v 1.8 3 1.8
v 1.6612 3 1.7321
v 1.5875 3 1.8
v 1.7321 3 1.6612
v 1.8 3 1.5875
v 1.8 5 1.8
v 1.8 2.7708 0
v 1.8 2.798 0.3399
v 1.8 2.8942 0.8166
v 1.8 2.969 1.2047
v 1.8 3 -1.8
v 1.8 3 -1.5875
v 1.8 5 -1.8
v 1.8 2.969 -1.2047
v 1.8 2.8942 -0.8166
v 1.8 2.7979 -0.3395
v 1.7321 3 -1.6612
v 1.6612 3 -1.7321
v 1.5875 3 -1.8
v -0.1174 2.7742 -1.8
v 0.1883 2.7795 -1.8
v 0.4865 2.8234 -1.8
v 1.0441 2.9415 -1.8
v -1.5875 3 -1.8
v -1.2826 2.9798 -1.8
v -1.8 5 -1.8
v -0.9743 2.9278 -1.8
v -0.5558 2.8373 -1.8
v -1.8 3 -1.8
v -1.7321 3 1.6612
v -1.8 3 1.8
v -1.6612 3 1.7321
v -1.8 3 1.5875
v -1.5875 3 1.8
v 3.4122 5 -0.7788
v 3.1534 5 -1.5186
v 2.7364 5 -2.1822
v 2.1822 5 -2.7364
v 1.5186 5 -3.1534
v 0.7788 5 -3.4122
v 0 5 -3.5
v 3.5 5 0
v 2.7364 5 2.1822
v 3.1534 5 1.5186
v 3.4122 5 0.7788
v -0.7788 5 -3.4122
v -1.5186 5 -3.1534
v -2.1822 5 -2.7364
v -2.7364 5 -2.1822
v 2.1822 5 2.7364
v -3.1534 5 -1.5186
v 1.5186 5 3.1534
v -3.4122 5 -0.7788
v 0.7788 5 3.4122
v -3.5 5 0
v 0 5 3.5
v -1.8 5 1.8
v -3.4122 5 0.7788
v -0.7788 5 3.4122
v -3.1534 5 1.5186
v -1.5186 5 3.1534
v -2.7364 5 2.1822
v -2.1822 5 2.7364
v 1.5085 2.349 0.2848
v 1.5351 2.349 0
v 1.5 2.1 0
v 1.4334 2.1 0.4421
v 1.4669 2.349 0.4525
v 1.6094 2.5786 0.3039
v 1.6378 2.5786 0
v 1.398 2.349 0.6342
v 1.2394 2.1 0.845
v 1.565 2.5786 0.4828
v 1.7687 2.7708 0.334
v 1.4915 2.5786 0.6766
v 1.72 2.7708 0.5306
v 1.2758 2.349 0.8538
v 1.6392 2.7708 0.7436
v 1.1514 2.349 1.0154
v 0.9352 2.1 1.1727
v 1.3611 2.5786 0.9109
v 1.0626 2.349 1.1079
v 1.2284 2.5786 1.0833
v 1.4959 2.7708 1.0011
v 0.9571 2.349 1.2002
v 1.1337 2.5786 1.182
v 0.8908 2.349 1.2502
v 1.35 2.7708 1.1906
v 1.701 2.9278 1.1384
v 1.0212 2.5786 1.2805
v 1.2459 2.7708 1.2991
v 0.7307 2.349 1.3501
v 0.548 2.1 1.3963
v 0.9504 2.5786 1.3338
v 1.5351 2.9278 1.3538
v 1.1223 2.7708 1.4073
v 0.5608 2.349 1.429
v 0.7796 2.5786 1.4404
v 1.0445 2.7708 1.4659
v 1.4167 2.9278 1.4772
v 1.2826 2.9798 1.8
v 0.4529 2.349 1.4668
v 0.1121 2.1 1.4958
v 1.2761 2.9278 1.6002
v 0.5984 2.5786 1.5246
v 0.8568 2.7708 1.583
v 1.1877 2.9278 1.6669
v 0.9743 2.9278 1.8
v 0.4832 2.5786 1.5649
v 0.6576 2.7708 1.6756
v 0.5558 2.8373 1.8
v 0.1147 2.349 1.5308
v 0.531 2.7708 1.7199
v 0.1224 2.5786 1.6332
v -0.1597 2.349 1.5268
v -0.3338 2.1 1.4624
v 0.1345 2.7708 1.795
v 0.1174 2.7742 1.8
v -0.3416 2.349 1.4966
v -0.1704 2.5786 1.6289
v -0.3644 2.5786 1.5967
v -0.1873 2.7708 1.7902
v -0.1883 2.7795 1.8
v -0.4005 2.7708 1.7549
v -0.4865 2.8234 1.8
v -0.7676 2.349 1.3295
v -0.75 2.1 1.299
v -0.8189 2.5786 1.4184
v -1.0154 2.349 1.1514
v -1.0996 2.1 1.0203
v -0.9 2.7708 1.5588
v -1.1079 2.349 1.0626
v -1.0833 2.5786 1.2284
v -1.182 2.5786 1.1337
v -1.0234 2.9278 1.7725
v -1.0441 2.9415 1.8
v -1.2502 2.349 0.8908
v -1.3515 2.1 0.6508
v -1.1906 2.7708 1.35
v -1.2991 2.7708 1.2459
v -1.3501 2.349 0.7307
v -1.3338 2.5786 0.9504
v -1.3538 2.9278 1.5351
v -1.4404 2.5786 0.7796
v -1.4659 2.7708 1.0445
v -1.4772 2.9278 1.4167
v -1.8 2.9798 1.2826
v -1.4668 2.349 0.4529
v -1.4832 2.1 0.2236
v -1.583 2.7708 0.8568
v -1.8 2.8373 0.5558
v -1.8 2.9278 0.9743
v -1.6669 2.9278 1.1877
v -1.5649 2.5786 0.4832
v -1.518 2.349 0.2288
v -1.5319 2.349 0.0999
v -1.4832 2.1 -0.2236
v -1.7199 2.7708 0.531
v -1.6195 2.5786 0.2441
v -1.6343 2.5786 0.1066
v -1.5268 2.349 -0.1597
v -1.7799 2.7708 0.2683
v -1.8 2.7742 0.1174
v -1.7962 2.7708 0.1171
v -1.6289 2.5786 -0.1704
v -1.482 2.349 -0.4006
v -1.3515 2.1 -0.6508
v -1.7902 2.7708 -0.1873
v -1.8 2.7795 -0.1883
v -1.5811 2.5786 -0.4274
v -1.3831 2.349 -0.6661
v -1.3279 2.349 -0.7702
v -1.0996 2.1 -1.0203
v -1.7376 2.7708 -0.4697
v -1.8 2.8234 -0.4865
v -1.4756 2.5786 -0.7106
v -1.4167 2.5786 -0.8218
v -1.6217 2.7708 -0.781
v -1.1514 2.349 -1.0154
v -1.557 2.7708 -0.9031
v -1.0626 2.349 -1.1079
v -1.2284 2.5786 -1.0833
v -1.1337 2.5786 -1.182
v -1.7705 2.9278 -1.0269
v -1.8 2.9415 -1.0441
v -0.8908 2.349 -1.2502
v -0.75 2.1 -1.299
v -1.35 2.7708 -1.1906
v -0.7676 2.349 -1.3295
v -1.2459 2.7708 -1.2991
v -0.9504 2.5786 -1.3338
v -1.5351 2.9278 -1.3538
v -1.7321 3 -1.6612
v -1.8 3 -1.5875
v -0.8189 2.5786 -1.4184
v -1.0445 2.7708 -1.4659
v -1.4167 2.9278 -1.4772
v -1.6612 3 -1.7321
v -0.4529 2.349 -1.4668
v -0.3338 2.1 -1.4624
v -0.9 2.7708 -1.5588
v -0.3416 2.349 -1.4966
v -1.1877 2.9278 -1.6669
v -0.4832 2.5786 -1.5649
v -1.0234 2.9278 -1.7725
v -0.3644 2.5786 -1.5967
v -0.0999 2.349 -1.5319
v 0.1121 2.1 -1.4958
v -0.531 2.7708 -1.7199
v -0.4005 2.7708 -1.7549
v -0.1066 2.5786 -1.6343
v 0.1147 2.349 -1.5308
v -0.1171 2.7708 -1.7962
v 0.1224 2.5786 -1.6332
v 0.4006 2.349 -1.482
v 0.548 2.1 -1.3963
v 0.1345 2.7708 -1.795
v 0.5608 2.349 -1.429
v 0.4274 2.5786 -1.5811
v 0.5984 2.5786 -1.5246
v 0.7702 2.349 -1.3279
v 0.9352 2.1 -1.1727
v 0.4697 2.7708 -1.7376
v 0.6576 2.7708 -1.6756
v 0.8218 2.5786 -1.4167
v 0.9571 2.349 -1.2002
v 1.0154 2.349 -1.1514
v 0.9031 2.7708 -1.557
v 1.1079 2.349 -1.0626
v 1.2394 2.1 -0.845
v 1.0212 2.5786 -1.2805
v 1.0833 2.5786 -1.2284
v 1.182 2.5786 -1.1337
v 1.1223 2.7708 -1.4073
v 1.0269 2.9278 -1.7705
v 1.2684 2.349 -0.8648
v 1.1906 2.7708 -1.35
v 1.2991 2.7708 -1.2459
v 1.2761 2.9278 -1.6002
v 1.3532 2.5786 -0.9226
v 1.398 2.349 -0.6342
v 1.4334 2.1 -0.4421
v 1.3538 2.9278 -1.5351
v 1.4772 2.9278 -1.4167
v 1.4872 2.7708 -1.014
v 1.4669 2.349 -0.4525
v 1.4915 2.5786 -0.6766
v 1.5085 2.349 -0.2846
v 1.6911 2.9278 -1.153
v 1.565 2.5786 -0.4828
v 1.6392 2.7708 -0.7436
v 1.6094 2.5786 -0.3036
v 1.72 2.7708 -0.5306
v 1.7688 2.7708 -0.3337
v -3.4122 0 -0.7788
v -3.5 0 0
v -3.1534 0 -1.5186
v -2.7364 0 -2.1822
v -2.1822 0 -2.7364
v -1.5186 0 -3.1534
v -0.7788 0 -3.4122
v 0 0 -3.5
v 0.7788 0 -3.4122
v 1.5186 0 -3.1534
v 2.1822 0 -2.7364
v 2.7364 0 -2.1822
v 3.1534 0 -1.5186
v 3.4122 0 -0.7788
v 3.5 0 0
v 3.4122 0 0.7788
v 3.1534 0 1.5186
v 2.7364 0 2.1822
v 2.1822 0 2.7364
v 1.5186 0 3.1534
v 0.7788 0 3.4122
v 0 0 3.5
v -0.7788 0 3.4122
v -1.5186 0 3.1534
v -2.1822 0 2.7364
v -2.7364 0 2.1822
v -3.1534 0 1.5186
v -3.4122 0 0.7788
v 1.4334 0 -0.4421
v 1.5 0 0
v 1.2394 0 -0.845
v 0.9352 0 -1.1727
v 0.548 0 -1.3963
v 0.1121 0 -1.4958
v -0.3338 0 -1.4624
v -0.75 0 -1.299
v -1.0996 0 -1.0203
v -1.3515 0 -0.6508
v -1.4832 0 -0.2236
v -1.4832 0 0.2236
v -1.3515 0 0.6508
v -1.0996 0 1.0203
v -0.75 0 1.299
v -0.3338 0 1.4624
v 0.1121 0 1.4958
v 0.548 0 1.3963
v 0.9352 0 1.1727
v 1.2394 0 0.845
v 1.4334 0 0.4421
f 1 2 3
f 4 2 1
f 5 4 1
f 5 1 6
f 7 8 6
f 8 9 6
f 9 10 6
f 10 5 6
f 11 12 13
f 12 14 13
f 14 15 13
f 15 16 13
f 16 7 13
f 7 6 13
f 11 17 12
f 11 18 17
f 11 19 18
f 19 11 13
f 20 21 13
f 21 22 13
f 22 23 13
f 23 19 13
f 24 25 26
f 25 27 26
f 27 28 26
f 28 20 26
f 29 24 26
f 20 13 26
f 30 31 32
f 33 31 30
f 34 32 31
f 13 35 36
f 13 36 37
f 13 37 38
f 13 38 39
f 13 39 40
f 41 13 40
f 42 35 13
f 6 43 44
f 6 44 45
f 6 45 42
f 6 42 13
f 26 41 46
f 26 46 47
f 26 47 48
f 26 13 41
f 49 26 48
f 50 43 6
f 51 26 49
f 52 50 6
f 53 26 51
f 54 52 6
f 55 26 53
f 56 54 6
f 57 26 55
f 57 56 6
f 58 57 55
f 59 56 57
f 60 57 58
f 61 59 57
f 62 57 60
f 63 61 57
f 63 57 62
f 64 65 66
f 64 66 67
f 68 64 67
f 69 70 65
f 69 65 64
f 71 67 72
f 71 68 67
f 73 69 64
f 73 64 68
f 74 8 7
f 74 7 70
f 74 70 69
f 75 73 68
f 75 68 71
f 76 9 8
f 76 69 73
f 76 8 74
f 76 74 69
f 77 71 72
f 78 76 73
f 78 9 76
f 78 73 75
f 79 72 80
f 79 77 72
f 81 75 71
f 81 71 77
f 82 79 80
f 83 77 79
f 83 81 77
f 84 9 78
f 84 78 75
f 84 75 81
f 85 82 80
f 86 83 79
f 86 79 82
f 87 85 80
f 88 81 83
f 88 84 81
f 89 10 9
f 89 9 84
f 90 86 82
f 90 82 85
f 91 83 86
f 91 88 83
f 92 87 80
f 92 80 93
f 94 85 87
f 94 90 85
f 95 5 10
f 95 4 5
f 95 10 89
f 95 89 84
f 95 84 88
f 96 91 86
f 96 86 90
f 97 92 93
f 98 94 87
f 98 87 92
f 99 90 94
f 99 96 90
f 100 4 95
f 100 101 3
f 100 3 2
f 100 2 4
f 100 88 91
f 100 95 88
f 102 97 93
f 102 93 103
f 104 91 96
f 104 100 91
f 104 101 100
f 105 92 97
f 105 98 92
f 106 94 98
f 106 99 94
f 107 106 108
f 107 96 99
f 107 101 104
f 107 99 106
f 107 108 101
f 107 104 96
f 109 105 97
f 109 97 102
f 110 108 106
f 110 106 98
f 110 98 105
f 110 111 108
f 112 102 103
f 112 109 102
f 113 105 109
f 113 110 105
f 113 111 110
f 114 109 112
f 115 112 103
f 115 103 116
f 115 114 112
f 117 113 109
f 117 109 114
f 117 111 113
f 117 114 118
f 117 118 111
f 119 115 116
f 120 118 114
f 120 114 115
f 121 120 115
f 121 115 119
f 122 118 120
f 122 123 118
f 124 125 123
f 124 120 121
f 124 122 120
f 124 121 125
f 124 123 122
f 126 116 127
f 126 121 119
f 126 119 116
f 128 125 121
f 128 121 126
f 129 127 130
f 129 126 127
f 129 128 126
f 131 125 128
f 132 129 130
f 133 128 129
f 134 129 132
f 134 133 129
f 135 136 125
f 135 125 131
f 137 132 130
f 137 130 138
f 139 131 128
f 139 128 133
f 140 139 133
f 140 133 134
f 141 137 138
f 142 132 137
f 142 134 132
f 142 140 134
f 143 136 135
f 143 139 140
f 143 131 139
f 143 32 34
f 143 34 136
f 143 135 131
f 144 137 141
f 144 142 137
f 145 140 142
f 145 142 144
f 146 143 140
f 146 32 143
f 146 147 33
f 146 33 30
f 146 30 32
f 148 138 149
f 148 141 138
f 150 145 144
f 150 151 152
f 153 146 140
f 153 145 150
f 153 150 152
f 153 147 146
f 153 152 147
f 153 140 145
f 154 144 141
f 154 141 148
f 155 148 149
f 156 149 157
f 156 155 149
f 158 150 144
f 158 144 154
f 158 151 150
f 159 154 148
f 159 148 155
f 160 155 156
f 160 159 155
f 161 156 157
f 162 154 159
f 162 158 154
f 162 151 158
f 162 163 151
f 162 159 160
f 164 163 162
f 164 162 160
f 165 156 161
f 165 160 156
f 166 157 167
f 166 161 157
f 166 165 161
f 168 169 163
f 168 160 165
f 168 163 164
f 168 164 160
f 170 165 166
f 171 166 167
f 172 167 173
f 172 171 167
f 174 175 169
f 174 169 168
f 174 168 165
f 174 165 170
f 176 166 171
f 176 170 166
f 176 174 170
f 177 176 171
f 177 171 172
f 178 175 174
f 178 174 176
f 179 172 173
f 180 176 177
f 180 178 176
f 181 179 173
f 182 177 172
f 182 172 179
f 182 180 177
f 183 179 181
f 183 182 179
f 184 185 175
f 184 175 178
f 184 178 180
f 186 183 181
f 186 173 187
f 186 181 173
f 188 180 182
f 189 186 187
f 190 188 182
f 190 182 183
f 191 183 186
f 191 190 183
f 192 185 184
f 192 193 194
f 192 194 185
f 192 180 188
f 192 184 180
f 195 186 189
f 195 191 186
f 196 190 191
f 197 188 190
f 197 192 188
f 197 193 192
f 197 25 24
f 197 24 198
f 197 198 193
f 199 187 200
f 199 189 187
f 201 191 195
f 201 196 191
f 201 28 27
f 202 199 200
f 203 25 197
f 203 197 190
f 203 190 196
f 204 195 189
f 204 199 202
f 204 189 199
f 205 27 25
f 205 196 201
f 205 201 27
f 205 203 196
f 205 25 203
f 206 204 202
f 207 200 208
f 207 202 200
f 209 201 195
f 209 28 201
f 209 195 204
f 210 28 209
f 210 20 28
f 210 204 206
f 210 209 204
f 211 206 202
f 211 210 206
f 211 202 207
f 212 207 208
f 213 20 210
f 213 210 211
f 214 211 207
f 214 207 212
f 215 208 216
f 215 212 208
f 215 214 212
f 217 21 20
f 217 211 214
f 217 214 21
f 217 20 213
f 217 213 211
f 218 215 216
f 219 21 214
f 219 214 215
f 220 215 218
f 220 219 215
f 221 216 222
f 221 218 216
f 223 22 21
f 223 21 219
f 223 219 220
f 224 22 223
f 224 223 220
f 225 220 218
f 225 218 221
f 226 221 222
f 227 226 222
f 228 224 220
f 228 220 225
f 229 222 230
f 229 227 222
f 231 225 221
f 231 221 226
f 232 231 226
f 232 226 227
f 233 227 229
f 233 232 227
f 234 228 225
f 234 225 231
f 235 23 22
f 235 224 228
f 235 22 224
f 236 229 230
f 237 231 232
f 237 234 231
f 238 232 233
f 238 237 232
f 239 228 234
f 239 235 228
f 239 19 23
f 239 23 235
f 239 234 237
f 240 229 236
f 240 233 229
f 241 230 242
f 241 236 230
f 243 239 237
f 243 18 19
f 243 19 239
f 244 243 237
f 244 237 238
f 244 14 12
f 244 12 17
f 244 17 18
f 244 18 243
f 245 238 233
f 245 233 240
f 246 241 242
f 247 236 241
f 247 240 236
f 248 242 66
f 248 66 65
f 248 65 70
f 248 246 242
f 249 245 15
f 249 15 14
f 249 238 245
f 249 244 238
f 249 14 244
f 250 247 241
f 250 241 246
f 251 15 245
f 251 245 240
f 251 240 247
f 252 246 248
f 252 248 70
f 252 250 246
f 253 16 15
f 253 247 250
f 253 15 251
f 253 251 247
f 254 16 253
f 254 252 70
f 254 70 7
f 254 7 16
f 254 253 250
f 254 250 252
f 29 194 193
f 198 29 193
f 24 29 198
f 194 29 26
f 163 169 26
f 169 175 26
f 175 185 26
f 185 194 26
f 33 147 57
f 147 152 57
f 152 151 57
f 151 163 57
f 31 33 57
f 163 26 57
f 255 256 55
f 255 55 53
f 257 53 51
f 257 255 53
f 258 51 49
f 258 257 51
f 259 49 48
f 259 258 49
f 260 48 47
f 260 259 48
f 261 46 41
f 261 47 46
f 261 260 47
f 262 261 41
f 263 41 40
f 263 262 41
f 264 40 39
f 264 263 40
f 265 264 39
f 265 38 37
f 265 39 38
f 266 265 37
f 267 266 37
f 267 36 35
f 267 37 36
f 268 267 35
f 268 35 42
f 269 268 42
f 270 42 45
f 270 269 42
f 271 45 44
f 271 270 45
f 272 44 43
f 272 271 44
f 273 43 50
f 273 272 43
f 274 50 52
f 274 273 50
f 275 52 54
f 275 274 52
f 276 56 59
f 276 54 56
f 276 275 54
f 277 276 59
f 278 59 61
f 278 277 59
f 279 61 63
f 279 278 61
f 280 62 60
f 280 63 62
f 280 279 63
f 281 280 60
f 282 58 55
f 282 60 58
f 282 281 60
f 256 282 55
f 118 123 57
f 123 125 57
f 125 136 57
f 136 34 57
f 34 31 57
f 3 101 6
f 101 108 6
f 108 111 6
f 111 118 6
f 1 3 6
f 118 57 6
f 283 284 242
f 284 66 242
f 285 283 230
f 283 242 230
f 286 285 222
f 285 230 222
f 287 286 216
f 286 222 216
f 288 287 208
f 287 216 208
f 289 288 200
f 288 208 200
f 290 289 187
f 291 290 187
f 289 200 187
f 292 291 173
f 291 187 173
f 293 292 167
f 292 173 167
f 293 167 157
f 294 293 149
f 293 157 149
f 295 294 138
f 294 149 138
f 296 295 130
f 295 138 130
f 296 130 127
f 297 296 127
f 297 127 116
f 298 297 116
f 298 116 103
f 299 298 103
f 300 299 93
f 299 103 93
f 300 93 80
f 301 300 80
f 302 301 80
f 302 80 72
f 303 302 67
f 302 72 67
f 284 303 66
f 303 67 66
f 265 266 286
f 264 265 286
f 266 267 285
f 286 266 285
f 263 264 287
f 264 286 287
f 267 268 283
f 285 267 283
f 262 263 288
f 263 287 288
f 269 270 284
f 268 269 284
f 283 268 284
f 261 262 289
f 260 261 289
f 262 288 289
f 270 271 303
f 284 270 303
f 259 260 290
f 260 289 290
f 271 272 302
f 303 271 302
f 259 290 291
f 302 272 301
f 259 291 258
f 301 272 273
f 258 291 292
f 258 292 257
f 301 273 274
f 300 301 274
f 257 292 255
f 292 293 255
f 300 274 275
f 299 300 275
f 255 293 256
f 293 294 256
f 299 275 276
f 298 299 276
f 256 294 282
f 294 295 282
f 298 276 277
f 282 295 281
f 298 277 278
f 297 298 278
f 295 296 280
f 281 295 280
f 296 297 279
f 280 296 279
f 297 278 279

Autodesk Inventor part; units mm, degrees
ref_plane "YZ Plane" through (0, 0, 0) normal (1, 0, 0) x (0, 1, 0)
ref_plane "XZ Plane" through (0, 0, 0) normal (0, 1, 0) x (-1, 0, 0)
ref_plane "XY Plane" through (0, 0, 0) normal (0, 0, 1) x (1, 0, 0)
sketch "Sketch1" plane through (0, 0, 0) normal (0, 1, 0) x (-1, 0, 0)
  circle A0 centre (0, 0) radius 3.5
  dimension "d0" = 7
extrude "Extrusion1" add sketch "Sketch1" along normal blind 5
sketch "Sketch2" plane through (0, 5, 0) normal (0, 1, 0) x (1, 0, 0)
  line L0 (-1.8, -1.8) -> (1.8, -1.8)
  line L1 (1.8, -1.8) -> (1.8, 1.8)
  line L2 (1.8, 1.8) -> (-1.8, 1.8)
  line L3 (-1.8, 1.8) -> (-1.8, -1.8)
  point P0 (0, 0)
  dimension "d3" = 3.6
  dimension "d4" = 3.6
  dimension "d5" = 1.8
  dimension "d6" = 1.8
extrude "Extrusion2" cut sketch "Sketch2" against normal blind 2
sketch "Sketch3" plane through (0, 3, 0) normal (0, 1, 0) x (1, 0, 0)
  circle A0 centre (0, 0) radius 1.5
  dimension "d9" = 3
extrude "Extrusion3" cut sketch "Sketch3" against normal through all
fillet "Fillet1" radius 0.9 1 edges at (-1.5, 3, 0)
properties part number "LED8SUPPORT"
